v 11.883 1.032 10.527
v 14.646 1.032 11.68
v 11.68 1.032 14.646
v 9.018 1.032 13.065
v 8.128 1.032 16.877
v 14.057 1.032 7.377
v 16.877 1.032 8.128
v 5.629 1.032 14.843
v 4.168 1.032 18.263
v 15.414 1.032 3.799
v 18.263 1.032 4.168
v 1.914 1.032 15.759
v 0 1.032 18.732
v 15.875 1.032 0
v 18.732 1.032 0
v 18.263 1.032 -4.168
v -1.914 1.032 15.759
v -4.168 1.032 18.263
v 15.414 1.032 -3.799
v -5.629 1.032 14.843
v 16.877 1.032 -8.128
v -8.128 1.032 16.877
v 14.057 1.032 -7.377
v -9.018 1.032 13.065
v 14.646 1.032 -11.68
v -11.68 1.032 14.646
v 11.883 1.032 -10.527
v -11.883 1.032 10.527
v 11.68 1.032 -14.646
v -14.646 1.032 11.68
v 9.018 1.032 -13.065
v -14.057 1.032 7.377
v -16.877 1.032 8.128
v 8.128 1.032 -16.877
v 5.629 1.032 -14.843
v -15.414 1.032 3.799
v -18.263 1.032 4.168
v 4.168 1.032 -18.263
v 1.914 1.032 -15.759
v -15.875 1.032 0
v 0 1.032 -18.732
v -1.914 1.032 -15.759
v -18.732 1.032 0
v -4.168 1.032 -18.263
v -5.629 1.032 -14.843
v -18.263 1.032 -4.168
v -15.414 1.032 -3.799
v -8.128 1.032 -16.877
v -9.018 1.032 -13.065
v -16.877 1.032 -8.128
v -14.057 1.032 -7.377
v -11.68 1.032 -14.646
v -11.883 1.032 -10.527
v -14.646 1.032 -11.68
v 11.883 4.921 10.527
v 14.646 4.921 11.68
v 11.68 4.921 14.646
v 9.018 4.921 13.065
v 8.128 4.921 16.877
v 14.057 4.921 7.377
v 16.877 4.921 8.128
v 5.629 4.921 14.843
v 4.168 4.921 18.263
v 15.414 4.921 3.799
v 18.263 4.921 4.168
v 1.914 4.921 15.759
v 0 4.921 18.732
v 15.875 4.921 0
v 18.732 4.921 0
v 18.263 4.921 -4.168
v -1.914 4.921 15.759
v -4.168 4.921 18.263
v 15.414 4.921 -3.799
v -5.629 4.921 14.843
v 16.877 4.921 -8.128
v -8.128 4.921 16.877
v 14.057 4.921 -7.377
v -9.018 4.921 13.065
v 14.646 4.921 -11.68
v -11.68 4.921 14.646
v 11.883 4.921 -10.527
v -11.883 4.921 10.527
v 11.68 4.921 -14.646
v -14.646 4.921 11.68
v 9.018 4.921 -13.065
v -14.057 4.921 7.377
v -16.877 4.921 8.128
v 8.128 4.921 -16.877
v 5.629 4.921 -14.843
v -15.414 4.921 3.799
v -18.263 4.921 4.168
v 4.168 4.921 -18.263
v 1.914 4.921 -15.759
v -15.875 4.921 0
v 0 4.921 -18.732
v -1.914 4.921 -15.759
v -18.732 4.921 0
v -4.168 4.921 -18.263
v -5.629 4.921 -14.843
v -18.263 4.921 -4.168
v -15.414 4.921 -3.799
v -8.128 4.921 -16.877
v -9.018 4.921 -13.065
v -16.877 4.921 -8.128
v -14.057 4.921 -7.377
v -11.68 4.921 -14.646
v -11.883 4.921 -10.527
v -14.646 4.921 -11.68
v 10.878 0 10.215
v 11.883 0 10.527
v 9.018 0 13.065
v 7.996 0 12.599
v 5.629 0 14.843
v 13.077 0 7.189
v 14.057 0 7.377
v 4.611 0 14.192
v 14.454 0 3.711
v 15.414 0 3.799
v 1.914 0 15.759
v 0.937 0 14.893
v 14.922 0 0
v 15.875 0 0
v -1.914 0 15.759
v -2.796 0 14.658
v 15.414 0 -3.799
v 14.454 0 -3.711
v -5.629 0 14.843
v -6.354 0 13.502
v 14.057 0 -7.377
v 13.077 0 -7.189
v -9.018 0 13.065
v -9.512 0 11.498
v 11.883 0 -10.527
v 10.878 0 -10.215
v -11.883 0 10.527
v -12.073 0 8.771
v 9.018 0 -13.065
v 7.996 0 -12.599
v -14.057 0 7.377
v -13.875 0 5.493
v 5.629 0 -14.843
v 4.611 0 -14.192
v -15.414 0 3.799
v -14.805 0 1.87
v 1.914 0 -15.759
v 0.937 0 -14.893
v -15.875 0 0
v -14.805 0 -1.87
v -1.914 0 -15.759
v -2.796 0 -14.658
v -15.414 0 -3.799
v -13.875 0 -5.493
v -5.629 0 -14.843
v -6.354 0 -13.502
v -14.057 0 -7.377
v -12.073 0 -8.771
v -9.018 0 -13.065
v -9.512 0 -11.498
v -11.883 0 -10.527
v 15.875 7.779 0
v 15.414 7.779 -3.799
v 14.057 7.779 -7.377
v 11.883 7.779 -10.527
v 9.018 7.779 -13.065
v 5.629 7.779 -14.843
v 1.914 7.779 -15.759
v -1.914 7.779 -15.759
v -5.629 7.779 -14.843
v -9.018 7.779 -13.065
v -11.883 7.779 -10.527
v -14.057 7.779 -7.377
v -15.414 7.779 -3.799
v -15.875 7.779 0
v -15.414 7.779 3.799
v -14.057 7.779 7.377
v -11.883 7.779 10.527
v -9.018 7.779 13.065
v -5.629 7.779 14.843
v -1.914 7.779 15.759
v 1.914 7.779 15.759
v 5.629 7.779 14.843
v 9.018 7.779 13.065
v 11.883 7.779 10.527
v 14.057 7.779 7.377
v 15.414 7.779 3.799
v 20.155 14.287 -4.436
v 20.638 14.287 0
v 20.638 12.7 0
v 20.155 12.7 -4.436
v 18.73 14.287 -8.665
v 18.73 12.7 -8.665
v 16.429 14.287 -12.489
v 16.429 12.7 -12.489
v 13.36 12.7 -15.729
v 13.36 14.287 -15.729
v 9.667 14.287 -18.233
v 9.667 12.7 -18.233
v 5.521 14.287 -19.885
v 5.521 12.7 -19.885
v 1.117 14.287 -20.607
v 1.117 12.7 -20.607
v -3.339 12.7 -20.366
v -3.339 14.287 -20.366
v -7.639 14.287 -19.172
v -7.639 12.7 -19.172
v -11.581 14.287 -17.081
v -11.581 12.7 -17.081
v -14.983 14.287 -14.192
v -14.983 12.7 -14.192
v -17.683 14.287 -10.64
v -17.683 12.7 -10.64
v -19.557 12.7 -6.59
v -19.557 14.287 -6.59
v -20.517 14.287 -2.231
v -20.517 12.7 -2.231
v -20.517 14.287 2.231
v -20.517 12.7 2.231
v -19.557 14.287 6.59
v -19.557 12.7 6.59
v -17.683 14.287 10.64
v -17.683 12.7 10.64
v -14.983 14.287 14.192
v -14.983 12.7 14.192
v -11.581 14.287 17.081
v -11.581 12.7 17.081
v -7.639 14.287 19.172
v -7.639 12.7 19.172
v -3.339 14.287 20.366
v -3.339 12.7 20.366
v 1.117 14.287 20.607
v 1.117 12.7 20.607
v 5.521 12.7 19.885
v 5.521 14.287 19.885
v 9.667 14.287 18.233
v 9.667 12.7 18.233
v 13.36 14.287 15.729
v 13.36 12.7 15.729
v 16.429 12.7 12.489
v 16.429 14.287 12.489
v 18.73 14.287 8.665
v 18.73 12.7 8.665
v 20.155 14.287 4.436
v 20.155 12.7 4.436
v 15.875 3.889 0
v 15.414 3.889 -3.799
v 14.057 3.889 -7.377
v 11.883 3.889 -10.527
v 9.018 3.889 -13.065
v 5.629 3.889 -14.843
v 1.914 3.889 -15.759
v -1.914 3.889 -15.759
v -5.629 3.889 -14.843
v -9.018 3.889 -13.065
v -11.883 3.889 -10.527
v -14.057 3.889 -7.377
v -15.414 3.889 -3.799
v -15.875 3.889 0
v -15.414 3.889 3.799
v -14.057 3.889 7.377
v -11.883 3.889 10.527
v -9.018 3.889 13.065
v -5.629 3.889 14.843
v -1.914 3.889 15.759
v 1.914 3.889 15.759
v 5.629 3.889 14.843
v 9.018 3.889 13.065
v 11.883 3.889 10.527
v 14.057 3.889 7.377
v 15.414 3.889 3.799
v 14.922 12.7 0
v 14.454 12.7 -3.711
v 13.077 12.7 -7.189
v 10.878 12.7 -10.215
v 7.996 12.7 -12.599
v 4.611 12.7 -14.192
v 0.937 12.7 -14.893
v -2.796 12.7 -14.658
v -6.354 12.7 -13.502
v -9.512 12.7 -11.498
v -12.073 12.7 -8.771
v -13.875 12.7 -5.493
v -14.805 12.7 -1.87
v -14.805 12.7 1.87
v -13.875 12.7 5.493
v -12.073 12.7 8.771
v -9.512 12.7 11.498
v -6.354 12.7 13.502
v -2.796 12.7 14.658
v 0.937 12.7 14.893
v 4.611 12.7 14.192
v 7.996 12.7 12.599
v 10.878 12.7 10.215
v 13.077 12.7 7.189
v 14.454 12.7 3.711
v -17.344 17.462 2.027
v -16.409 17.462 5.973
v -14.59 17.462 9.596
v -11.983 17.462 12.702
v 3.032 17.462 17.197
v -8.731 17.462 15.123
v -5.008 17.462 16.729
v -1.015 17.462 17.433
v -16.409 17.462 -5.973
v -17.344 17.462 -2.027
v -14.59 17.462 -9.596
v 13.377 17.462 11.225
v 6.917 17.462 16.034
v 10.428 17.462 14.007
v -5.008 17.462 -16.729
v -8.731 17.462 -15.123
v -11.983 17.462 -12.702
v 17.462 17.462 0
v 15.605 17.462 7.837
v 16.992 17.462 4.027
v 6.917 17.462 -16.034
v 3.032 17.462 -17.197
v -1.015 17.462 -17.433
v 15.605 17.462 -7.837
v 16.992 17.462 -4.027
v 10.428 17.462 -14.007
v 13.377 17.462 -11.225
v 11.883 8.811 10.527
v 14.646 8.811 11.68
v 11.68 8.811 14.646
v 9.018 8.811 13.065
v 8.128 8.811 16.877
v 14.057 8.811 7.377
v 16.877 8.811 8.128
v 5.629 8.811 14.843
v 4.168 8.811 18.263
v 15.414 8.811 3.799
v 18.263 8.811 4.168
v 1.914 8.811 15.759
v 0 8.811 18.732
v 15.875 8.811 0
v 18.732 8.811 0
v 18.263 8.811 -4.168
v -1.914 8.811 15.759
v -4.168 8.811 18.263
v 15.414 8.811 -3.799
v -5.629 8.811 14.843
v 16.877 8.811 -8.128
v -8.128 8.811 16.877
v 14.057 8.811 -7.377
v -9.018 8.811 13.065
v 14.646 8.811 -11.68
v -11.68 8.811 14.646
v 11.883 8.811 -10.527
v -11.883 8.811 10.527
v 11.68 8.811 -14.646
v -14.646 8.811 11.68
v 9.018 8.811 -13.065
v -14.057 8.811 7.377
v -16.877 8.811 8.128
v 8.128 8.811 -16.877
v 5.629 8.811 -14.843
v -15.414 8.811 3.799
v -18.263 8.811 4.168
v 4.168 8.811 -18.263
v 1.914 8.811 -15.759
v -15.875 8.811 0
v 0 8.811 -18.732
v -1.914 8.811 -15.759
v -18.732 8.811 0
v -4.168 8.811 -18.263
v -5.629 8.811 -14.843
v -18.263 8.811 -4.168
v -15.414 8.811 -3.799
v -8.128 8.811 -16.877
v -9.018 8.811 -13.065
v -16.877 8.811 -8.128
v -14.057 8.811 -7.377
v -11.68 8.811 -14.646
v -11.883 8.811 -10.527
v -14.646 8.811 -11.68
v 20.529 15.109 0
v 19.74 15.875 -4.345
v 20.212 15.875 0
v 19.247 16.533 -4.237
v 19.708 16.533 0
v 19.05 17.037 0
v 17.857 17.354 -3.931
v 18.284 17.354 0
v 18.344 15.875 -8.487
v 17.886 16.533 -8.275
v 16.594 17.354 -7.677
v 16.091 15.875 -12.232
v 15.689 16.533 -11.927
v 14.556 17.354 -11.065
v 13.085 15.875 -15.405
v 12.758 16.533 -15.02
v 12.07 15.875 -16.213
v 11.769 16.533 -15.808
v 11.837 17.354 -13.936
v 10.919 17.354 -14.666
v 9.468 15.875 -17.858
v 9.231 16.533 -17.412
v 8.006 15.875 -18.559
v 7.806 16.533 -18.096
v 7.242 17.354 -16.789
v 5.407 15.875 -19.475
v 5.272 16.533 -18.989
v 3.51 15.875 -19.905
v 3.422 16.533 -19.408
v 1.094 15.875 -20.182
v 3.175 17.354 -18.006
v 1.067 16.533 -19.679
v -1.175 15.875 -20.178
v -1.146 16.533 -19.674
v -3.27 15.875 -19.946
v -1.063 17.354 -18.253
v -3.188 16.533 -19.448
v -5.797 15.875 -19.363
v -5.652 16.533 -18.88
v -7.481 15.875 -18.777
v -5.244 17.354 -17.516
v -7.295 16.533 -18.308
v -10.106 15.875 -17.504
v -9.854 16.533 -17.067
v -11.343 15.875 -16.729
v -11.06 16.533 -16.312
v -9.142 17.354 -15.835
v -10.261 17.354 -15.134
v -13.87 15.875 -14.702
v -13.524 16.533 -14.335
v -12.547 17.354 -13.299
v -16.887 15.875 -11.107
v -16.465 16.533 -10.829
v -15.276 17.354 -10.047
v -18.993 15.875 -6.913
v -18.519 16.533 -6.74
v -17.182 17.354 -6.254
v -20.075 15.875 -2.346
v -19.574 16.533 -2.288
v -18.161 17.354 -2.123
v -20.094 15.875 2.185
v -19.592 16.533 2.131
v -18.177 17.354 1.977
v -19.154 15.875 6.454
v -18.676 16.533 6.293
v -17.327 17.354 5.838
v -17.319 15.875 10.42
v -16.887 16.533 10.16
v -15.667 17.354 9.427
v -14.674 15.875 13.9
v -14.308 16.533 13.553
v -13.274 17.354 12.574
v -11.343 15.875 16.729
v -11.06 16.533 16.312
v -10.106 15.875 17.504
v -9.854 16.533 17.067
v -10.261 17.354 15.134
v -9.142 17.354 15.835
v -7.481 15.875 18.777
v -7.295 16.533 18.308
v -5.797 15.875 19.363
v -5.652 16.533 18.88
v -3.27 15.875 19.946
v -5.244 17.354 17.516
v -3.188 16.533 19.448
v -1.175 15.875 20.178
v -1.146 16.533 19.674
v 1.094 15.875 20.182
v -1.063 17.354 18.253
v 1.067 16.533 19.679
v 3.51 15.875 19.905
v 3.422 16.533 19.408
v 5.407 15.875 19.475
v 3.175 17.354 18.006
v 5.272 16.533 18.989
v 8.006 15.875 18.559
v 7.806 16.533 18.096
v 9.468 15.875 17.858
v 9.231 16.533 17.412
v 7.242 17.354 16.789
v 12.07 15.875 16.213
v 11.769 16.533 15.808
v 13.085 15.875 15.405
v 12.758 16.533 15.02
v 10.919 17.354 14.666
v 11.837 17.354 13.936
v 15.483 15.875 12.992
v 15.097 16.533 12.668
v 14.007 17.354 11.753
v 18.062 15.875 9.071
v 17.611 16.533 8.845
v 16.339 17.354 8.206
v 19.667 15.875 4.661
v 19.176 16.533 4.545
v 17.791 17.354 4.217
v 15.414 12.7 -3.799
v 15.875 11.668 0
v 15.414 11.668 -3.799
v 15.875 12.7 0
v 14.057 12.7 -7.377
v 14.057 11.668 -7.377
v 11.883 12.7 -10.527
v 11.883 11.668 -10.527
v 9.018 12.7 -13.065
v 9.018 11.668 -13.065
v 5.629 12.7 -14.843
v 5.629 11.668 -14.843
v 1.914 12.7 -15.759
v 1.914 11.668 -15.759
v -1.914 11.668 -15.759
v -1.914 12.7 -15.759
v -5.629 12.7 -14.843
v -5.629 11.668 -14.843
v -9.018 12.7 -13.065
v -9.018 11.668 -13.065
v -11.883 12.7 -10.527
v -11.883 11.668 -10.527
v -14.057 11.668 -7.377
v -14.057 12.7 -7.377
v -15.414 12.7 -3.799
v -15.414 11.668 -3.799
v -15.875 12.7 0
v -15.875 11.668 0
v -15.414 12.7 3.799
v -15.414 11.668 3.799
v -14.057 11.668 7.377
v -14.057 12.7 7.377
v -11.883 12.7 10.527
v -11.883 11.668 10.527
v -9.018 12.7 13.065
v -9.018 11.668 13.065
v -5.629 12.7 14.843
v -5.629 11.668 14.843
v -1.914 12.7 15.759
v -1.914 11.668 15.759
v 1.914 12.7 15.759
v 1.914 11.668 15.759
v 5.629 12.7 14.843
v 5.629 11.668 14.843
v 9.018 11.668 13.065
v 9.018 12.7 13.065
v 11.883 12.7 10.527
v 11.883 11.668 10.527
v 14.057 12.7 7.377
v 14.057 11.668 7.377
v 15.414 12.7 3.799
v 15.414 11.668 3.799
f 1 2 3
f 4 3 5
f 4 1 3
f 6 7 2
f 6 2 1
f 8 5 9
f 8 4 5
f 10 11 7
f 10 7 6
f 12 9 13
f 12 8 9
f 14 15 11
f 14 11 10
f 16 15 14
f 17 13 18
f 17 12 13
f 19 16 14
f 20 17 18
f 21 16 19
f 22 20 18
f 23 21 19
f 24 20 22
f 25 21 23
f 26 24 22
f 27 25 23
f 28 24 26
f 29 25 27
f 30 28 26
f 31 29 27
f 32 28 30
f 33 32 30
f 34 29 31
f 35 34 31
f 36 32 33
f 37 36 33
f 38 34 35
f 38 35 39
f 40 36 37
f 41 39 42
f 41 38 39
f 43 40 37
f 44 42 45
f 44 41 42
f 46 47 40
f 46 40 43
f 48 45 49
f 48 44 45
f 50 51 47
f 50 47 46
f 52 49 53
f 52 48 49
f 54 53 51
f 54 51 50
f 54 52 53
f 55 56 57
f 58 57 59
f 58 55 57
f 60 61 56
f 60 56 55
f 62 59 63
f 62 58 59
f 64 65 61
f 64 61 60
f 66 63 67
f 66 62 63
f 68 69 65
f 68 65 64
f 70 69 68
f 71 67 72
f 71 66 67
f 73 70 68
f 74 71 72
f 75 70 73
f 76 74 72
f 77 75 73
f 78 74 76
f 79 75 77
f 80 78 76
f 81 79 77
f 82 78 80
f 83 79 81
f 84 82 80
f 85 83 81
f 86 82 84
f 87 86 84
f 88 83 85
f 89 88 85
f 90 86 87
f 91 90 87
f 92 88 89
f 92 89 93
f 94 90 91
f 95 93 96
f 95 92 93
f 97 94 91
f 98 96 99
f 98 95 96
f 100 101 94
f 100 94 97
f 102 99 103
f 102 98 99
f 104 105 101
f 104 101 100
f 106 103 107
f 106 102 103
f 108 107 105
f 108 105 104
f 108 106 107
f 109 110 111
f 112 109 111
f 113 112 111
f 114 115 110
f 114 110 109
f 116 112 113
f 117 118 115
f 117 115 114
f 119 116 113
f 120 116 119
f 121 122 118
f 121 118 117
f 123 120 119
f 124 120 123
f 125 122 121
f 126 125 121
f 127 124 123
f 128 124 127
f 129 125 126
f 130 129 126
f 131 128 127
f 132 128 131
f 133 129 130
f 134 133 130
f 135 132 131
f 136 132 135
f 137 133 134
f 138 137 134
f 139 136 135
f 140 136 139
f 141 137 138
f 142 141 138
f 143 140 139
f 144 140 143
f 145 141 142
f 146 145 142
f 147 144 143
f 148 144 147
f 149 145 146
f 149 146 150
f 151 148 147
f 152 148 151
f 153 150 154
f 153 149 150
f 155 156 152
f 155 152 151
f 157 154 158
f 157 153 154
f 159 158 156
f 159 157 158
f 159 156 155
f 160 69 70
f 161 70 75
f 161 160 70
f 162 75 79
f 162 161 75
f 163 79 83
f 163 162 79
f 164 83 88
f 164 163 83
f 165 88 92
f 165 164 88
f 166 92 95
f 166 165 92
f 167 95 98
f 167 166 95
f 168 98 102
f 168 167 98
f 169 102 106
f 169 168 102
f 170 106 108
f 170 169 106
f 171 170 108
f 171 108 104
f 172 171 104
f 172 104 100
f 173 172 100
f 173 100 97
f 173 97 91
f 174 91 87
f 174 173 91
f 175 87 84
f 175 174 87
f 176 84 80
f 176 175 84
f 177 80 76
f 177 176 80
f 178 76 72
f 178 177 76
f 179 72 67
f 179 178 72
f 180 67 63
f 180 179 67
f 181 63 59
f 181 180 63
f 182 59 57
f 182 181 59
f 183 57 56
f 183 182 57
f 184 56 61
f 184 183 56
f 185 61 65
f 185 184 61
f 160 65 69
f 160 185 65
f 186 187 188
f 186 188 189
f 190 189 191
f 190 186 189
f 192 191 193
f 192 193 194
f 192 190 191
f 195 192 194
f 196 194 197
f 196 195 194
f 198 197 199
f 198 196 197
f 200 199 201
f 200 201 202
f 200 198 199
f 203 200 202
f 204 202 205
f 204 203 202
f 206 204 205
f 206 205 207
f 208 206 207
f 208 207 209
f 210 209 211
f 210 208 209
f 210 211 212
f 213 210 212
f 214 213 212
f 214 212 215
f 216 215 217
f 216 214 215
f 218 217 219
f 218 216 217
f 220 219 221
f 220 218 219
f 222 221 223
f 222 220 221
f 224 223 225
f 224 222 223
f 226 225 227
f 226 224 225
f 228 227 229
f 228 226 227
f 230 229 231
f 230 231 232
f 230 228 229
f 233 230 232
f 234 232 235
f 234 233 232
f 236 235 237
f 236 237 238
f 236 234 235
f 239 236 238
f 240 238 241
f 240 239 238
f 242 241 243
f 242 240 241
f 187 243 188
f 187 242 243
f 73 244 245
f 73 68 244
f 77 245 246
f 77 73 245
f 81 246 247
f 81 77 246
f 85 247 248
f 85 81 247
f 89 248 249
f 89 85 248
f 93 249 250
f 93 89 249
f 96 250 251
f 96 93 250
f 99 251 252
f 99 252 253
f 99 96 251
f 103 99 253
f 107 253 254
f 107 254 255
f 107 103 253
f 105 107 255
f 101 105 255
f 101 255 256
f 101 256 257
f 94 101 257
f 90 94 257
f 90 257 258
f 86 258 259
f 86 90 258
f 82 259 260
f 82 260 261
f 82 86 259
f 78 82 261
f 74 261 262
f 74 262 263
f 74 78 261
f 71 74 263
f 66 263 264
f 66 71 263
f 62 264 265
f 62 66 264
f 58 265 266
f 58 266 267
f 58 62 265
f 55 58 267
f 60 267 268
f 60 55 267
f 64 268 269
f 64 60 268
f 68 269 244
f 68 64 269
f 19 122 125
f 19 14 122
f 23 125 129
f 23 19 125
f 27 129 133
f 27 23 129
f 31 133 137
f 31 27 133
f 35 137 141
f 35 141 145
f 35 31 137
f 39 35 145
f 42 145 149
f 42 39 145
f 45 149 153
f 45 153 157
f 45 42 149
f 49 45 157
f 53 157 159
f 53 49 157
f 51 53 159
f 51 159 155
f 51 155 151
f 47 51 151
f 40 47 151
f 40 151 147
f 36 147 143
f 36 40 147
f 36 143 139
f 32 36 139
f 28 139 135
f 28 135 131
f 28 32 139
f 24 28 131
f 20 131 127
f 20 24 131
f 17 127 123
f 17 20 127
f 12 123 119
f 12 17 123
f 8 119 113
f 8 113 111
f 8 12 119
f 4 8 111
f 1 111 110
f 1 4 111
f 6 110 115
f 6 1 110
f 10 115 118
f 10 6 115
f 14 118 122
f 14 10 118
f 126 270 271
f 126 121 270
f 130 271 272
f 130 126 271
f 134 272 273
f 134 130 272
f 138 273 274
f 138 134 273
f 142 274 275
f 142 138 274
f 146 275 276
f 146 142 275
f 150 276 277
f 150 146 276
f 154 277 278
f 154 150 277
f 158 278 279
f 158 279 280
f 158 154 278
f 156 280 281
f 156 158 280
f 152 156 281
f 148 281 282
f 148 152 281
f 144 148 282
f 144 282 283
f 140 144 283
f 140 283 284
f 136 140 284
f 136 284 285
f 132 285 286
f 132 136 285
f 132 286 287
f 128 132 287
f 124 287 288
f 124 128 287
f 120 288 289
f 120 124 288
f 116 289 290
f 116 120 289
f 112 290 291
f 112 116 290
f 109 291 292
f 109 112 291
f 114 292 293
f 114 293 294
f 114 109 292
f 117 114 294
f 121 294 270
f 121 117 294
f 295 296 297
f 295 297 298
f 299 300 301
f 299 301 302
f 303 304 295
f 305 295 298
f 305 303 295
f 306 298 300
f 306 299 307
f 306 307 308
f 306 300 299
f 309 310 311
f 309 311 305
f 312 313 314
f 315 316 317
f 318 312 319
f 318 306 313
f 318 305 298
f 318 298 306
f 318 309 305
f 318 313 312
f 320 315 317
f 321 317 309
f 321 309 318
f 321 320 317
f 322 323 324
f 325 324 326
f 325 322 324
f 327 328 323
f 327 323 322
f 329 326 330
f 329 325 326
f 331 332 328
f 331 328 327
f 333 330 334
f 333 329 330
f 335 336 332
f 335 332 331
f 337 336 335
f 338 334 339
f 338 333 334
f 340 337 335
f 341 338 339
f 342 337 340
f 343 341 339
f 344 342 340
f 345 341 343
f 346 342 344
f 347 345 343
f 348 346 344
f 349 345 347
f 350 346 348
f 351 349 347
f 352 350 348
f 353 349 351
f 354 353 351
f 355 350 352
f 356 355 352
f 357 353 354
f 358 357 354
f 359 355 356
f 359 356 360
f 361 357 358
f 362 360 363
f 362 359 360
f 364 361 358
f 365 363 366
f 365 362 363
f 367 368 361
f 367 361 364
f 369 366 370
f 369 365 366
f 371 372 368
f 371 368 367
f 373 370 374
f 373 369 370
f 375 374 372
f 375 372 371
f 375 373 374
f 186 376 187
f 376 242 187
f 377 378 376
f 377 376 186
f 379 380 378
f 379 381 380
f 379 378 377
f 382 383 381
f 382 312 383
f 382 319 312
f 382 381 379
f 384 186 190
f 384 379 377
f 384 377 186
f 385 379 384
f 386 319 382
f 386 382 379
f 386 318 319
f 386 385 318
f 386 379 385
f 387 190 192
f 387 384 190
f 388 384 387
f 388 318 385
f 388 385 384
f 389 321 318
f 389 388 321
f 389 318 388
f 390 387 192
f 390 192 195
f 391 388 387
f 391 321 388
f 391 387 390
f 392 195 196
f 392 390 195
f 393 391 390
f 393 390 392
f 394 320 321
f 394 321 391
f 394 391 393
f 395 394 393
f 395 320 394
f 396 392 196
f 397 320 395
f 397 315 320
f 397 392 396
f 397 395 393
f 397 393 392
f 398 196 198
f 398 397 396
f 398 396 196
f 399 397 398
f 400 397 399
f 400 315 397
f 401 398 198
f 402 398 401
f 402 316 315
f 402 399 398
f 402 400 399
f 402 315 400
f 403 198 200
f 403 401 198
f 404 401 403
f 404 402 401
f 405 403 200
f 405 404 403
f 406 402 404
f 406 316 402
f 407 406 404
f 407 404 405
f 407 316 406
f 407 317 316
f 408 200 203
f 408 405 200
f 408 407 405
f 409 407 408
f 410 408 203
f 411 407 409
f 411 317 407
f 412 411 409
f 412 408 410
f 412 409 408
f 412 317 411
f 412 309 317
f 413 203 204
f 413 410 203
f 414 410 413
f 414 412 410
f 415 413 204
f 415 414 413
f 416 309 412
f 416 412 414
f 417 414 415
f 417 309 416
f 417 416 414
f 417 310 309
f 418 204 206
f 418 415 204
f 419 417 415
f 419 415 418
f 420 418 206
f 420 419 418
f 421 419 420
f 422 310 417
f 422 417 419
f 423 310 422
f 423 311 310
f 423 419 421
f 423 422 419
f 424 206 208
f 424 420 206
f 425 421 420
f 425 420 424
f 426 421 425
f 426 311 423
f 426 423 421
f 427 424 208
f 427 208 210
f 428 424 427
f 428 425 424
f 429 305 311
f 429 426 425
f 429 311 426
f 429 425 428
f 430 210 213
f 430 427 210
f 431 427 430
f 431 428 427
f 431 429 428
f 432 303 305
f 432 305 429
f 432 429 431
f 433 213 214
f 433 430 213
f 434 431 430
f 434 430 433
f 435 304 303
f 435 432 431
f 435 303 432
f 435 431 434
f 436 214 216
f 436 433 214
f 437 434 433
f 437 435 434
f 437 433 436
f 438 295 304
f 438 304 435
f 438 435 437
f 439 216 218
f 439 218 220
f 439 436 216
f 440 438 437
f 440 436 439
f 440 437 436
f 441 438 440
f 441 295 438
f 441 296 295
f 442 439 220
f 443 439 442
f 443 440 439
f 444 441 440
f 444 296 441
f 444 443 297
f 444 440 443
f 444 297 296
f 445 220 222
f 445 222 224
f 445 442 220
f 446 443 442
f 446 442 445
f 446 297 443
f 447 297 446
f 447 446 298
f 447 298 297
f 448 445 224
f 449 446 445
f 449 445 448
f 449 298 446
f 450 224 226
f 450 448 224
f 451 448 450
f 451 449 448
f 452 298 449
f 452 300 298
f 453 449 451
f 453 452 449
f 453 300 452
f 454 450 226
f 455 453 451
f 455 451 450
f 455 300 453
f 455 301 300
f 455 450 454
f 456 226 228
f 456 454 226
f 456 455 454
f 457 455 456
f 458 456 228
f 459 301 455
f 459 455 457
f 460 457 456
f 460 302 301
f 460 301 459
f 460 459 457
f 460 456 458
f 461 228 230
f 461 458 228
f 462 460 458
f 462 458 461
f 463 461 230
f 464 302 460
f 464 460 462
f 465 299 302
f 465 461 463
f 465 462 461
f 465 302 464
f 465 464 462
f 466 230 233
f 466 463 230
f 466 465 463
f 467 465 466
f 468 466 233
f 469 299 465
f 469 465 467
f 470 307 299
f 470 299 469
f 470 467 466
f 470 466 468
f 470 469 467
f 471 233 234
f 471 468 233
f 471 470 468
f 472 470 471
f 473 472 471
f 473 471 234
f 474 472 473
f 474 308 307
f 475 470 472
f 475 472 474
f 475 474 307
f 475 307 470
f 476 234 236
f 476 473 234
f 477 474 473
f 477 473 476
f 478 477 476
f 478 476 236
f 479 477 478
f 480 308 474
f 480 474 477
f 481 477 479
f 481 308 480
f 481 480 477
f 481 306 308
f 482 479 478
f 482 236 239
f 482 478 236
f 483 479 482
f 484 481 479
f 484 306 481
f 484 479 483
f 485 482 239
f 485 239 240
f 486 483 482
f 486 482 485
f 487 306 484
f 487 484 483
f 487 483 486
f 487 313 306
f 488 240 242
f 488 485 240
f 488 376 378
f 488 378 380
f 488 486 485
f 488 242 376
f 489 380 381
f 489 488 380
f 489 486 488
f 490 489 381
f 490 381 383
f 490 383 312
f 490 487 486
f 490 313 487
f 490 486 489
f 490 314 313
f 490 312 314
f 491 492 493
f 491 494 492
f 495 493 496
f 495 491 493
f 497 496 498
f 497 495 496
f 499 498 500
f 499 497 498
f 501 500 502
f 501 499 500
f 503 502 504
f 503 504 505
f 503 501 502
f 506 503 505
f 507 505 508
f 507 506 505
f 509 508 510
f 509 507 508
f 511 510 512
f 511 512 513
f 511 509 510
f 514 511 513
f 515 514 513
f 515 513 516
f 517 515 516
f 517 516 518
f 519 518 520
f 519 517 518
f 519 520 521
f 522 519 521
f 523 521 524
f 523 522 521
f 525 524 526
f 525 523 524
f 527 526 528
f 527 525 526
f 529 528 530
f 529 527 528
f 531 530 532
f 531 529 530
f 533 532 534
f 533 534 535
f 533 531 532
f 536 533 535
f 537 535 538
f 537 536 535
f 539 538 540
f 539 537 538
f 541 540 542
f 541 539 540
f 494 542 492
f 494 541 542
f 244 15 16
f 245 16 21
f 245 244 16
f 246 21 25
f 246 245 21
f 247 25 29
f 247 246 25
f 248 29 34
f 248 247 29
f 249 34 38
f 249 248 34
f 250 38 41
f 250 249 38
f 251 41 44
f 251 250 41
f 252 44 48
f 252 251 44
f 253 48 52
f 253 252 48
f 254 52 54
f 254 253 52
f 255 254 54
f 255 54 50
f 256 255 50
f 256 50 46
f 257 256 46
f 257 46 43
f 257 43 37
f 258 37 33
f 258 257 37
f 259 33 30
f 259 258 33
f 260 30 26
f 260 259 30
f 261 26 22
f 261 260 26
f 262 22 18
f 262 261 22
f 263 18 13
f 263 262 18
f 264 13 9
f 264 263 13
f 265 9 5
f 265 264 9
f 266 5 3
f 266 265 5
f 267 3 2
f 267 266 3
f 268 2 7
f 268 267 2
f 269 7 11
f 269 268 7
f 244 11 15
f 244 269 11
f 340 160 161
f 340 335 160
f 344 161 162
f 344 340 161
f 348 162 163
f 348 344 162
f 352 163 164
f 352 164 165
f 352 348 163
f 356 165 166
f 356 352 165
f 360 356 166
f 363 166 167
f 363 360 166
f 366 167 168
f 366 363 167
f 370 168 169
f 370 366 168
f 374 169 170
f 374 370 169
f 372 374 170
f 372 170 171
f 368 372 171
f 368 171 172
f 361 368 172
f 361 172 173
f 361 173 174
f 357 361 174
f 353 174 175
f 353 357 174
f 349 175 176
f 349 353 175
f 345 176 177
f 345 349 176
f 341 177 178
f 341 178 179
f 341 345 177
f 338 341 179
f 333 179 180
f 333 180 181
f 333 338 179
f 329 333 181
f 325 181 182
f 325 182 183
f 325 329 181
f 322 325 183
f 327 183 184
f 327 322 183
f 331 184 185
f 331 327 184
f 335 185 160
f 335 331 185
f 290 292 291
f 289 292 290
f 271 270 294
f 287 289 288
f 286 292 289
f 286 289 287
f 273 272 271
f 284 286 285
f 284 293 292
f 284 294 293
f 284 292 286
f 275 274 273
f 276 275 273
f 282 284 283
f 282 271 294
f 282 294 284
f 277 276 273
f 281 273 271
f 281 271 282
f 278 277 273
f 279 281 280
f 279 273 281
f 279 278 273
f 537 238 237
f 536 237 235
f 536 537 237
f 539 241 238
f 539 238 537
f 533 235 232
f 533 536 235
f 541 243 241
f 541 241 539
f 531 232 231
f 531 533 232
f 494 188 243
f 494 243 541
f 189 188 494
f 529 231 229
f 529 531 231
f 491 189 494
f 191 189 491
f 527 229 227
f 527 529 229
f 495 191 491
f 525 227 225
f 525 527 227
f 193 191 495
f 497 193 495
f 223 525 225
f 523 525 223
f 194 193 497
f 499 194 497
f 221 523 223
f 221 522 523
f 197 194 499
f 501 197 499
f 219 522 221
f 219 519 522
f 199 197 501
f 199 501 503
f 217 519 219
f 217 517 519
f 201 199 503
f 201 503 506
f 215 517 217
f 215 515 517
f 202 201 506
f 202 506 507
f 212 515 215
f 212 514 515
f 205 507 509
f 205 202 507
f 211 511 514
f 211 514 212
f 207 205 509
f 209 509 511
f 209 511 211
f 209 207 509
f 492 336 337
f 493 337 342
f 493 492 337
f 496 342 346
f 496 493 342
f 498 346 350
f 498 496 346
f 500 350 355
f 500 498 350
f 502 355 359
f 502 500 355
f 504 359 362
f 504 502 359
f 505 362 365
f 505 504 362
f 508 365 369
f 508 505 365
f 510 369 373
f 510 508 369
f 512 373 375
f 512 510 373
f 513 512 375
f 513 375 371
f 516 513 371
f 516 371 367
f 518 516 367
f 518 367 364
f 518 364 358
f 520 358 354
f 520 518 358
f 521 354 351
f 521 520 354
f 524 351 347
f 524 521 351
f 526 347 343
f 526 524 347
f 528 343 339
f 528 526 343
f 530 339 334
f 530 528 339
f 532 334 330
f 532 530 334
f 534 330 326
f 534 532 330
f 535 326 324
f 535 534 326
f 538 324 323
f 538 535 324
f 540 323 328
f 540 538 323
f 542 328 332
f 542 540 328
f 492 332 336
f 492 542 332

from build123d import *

# Parameters (mm, degrees)
FILLET1_R = 3.175


with BuildPart() as part:
    # Sketch1 → Revolve1 (revolve)
    with BuildSketch(Plane.XY):
        Polygon((15.875, 0), (15.875, 1.031875), (18.7325, 1.031875), (15.875, 3.889375), (15.875, 4.92125), (18.7325, 4.92125), (15.875, 7.77875), (15.875, 8.810625), (18.7325, 8.810625), (15.875, 11.668125), (15.875, 12.7), (20.6375, 12.7), (20.6375, 17.4625), (0, 17.4625), (0, 12.7), (14.9225, 12.7), (14.9225, 0), align=None)
    revolve(axis=Axis((0, 0, 0), (0, 1, 0)))

    # Fillet1
    fillet1_edges = [part.edges().sort_by_distance(p)[0] for p in [
        (-20.6375, 17.4625, 0),
    ]]
    fillet(fillet1_edges, radius=FILLET1_R)


solid = part.part
